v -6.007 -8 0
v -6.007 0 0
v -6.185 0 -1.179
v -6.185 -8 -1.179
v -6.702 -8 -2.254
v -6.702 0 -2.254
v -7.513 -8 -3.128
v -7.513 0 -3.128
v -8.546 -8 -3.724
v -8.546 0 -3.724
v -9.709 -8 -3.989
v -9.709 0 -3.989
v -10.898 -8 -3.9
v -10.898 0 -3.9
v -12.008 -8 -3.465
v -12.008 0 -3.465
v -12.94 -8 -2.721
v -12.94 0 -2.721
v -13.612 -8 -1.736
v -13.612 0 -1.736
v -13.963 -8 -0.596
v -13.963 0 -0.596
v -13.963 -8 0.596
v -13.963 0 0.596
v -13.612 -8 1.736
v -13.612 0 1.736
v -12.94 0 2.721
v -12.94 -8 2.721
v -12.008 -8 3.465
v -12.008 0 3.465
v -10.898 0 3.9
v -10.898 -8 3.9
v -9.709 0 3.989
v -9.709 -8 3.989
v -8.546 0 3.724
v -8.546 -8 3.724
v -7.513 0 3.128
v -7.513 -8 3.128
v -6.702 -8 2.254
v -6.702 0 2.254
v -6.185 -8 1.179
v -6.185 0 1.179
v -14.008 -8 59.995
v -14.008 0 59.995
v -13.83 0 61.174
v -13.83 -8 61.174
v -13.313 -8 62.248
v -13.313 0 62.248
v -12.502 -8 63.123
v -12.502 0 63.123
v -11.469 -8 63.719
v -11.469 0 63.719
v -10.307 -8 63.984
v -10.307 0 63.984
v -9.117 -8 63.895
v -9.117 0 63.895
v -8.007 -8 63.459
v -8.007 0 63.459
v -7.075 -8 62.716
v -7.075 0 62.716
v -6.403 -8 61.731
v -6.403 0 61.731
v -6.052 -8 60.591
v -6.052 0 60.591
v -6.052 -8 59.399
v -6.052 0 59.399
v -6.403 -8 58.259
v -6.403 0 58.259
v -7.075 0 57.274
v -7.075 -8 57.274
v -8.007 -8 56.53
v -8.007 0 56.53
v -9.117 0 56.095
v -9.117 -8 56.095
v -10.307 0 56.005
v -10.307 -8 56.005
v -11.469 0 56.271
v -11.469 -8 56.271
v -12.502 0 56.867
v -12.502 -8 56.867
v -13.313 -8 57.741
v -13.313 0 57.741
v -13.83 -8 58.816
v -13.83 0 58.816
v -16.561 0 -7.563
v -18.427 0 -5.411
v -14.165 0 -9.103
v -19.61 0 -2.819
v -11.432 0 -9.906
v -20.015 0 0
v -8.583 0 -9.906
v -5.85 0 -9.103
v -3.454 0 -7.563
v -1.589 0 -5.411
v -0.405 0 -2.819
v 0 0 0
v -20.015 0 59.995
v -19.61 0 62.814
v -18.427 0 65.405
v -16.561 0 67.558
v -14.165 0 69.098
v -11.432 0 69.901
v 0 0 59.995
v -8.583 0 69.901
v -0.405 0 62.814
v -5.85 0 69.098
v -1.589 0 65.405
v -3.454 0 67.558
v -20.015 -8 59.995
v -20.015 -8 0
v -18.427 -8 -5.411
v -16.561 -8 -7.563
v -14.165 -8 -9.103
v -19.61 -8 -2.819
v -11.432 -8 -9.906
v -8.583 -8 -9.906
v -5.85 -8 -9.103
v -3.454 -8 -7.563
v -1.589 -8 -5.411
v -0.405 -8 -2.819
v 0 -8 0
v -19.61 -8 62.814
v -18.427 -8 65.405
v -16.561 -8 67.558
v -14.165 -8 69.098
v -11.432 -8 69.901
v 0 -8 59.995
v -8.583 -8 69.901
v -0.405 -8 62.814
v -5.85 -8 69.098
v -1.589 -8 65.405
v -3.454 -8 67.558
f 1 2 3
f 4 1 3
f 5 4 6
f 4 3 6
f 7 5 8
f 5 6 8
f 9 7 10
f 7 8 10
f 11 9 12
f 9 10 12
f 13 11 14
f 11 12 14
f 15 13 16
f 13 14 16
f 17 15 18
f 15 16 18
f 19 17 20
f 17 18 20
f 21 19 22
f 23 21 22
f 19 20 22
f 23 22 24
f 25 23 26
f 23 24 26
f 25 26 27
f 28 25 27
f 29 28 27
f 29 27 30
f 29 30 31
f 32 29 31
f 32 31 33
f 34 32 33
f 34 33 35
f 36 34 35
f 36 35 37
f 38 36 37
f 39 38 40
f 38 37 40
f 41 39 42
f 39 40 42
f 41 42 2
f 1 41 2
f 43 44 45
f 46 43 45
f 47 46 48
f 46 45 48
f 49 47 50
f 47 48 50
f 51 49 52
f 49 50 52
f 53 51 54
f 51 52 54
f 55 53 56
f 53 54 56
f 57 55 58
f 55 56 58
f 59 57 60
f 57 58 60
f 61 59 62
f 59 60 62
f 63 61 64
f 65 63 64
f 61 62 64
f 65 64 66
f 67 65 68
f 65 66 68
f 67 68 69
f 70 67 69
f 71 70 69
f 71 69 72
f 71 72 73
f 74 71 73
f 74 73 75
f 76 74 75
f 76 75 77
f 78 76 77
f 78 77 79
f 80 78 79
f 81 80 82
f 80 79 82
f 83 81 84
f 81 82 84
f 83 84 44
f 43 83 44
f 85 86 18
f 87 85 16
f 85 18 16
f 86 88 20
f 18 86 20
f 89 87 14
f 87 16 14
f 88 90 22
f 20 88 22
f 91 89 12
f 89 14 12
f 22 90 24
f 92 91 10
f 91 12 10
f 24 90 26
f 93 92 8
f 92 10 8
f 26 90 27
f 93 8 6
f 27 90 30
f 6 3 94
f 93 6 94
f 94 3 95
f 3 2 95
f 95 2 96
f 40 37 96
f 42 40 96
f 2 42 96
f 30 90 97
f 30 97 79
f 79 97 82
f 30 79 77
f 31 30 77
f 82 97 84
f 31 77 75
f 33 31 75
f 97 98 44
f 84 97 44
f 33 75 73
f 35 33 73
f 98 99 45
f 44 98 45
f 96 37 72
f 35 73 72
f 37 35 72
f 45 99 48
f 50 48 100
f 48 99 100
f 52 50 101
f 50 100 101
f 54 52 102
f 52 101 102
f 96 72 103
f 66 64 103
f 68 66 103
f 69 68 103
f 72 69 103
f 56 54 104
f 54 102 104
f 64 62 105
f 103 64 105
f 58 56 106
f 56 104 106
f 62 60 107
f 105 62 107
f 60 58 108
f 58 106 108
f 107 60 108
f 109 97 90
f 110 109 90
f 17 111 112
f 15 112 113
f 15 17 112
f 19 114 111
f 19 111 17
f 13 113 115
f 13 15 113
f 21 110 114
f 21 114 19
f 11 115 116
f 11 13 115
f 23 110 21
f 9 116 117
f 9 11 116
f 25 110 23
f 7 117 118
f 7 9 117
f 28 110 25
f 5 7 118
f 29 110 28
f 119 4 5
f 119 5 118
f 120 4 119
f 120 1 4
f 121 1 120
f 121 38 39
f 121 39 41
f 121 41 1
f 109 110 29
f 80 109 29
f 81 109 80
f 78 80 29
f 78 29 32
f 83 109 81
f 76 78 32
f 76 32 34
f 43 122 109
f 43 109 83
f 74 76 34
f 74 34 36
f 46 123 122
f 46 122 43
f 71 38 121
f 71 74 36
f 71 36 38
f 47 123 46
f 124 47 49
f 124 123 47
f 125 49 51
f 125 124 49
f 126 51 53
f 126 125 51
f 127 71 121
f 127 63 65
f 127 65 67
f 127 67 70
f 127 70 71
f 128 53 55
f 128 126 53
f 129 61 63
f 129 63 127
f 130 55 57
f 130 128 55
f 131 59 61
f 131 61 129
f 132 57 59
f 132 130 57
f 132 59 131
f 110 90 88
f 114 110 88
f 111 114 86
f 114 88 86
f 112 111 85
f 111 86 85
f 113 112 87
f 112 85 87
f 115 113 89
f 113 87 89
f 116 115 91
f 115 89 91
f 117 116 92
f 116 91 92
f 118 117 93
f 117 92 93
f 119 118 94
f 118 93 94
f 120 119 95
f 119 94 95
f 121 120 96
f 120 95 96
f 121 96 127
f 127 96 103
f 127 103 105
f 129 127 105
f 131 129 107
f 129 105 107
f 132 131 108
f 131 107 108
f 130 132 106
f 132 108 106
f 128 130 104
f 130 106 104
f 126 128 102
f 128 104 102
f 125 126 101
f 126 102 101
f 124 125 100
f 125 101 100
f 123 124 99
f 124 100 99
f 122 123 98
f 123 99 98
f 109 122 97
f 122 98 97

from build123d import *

# Parameters (mm, degrees)
F1_DEPTH = 8


with BuildPart() as f1:
    # F0 (on Front) → F1 (new body)
    with BuildSketch(Plane.XZ):
        with BuildLine():
            ThreePointArc((-20.0152, 59.9948), (-10.0076, 49.9872), (0, 59.9948))
            Line((0, 59.9948), (-6.0071, 59.9948))
            ThreePointArc((-6.0071, 59.9948), (-10.0076, 55.9943), (-14.0081, 59.9948))
            Line((-14.0081, 59.9948), (-20.0152, 59.9948))
        make_face()
        with BuildLine():
            Line((-6.0071, 59.9948), (0, 59.9948))
            ThreePointArc((0, 59.9948), (-10.0076, 70.0024), (-20.0152, 59.9948))
            Line((-20.0152, 59.9948), (-14.0081, 59.9948))
            ThreePointArc((-14.0081, 59.9948), (-10.0076, 63.9953), (-6.0071, 59.9948))
        make_face()
        with BuildLine():
            ThreePointArc((-20.0152, 0), (-10.0076, 10.0076), (0, 0))
            Line((0, 0), (0, 59.9948))
            ThreePointArc((0, 59.9948), (-10.0076, 49.9872), (-20.0152, 59.9948))
            Line((-20.0152, 59.9948), (-20.0152, 0))
        make_face()
        with BuildLine():
            ThreePointArc((-20.0152, 0), (-10.0076, -10.0076), (0, 0))
            Line((0, 0), (-6.0071, 0))
            ThreePointArc((-6.0071, 0), (-10.0076, -4.0005), (-14.0081, 0))
            Line((-14.0081, 0), (-20.0152, 0))
        make_face()
        with BuildLine():
            Line((-6.0071, 0), (0, 0))
            ThreePointArc((0, 0), (-10.0076, 10.0076), (-20.0152, 0))
            Line((-20.0152, 0), (-14.0081, 0))
            ThreePointArc((-14.0081, 0), (-10.0076, 4.0005), (-6.0071, 0))
        make_face()
    extrude(amount=F1_DEPTH)


solid = f1.part
